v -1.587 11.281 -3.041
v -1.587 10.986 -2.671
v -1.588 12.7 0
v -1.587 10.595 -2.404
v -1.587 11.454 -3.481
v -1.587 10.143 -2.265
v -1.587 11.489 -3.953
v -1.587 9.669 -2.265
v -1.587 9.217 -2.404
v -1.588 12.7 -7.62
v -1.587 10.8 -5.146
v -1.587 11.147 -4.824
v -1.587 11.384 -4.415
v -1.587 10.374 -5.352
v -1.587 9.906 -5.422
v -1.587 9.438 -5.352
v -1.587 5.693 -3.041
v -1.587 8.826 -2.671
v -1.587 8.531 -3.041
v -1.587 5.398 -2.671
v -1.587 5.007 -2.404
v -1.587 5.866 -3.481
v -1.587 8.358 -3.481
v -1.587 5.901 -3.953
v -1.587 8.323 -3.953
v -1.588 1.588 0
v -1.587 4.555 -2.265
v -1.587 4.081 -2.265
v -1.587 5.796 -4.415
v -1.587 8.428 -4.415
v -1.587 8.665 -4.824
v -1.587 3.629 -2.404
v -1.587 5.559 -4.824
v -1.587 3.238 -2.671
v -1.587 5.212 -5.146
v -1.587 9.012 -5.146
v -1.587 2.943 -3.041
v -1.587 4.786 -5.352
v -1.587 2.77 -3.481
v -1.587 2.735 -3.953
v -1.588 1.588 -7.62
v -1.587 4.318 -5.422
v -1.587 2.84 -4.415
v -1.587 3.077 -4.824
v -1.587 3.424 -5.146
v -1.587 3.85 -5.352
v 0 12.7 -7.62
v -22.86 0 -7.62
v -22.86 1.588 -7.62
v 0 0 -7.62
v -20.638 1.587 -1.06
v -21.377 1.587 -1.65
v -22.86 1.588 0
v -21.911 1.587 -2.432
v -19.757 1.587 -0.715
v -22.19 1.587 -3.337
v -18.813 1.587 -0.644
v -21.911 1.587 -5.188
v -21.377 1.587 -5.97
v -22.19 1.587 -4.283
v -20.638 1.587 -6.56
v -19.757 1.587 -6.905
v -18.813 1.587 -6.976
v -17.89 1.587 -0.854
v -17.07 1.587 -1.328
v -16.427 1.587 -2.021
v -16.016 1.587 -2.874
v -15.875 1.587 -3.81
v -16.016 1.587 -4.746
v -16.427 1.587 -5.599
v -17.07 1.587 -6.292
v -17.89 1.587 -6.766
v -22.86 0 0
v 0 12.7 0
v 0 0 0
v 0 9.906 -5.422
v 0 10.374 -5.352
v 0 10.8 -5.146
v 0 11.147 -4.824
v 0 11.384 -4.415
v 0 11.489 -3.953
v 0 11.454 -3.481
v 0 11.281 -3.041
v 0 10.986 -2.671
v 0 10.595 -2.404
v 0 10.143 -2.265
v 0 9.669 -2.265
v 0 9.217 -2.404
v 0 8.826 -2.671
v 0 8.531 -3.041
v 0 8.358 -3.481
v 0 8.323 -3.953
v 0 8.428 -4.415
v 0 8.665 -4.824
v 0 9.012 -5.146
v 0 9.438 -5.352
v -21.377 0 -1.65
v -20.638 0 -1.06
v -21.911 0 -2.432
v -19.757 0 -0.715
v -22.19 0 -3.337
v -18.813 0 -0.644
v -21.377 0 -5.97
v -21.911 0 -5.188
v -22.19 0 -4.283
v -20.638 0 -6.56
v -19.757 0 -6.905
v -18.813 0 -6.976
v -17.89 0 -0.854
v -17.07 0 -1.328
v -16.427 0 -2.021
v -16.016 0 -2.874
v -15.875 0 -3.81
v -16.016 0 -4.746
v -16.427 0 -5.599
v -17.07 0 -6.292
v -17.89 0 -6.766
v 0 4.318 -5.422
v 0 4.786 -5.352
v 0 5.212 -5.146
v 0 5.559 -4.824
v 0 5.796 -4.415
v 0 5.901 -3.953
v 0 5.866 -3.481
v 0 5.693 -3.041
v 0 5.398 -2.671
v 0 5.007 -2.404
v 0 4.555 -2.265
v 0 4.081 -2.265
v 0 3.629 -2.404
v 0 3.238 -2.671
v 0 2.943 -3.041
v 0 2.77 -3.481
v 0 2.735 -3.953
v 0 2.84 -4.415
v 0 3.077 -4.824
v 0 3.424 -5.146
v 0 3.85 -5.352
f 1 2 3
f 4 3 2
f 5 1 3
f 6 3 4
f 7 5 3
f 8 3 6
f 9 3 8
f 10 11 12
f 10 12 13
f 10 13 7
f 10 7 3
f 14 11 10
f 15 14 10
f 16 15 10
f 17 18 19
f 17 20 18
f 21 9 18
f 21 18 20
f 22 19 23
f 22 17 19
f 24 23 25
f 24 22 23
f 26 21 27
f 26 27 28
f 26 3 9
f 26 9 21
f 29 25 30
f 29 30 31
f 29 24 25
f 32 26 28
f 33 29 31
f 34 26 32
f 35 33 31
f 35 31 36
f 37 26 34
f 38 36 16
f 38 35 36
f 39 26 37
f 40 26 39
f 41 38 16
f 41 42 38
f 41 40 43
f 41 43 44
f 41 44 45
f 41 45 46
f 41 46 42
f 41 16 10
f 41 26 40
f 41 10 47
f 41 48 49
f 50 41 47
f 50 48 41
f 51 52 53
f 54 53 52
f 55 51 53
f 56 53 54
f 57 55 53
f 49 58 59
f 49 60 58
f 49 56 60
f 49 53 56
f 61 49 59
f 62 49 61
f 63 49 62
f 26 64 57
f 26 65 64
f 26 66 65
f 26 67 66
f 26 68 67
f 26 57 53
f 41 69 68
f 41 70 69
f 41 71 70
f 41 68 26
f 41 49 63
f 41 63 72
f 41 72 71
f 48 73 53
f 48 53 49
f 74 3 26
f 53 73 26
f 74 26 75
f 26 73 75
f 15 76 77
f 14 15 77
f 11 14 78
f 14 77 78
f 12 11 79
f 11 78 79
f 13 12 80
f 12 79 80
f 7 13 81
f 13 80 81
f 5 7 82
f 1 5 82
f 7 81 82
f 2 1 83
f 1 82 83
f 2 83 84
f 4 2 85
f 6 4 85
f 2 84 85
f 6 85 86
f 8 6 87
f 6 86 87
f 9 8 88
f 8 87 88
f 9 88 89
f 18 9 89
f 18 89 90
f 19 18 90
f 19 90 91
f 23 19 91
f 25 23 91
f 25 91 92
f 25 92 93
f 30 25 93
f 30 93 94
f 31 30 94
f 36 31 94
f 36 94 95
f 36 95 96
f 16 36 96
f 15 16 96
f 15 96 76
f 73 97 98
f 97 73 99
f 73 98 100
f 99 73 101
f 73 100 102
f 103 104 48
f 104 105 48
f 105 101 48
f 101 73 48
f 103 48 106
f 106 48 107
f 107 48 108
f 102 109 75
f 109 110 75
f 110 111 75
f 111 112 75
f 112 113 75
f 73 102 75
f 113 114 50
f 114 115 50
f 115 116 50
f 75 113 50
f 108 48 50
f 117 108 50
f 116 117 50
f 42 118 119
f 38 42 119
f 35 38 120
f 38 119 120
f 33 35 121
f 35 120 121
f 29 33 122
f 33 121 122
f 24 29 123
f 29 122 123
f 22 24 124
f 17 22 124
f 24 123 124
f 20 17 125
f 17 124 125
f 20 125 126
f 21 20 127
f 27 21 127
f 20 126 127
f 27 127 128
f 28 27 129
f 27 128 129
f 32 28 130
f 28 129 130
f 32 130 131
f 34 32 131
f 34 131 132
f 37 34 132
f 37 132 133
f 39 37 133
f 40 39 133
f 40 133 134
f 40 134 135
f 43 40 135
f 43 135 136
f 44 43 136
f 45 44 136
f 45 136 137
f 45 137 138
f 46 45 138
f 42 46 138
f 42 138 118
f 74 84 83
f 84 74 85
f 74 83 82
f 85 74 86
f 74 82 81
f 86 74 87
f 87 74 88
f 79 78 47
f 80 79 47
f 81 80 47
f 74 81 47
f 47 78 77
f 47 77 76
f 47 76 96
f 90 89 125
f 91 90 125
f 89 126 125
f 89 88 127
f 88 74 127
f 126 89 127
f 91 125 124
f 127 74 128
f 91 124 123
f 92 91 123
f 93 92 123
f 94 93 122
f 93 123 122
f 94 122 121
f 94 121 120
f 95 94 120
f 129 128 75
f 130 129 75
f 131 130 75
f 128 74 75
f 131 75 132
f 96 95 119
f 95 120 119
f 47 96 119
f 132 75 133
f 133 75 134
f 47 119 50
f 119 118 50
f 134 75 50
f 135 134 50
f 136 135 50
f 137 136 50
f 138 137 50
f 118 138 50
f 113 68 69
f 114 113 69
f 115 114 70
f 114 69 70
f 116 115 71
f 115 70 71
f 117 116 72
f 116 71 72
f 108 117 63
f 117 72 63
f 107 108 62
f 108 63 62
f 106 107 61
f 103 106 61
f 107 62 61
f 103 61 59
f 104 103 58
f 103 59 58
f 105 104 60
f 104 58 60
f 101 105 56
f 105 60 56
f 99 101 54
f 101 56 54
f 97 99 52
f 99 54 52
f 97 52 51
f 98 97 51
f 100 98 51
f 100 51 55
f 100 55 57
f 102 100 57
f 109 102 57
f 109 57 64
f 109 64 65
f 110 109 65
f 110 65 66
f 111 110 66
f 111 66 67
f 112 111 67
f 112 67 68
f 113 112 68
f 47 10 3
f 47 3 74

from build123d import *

# Parameters (mm, degrees)
SKETCH1_W                    = 23.8125
SKETCH1_H                    = 7.62
BOSS_EXTRUDE1_DEPTH          = 1.5875
SKETCH1_4_W                  = 1.5875
SKETCH1_4_H                  = 7.62
BOSS_EXTRUDE2_DEPTH          = 12.7
F_1_4_0_25_DIAMETER_HOLE1_D  = 6.35
CUT_EXTRUDE2_DEPTH           = 29.752600861
CUT_EXTRUDE2_DEPTH_BACK      = 1.5875
F_1_8_0_125_DIAMETER_HOLE1_D = 3.175


with BuildPart() as part:
    # Sketch1 → Boss-Extrude1 (new body)
    with BuildSketch(Plane(origin=(0, 0, 0), x_dir=(1, 0, 0), z_dir=(0, 1, 0))):
        with Locations((-13.49375, 3.81)):
            Rectangle(SKETCH1_W, SKETCH1_H)
    extrude(amount=BOSS_EXTRUDE1_DEPTH)

    # Sketch1<4> → Boss-Extrude2 (add)
    with BuildSketch(Plane(origin=(0, 0, 0), x_dir=(1, 0, 0), z_dir=(0, 1, 0))):
        with Locations((-0.79375, 3.81)):
            Rectangle(SKETCH1_4_W, SKETCH1_4_H)
    extrude(amount=BOSS_EXTRUDE2_DEPTH)

    # 1/4 (0.25) Diameter Hole1 (through all)
    with Locations(Plane(origin=(0, 0, 0), x_dir=(-1, 0, 0), z_dir=(0, -1, 0))):
        with Locations((19.05, 3.81)):
            Hole(F_1_4_0_25_DIAMETER_HOLE1_D / 2)

    # Sketch7 → Cut-Extrude2 (cut, two sides: drawn at the far end of the back side and taken through both)
    with BuildSketch(Plane(origin=(0, 1.5875, 0), x_dir=(1, 0, 0), z_dir=(0, 1, 0)).offset(-CUT_EXTRUDE2_DEPTH_BACK)):
        Polygon((-22.86, 65.813111541), (-22.86, 7.62), (-22.86, 0), (-22.86, -58.193111541), (-139.246223082, -58.193111541), (-139.246223082, 65.813111541), align=None)
    extrude(amount=CUT_EXTRUDE2_DEPTH + CUT_EXTRUDE2_DEPTH_BACK, mode=Mode.SUBTRACT)

    # 1/8 (0.125) Diameter Hole1 (through all)
    with Locations(Plane.ZY.offset(1.5875)):
        with Locations((-3.834673101, 9.906), (-3.834673101, 4.318)):
            Hole(F_1_8_0_125_DIAMETER_HOLE1_D / 2)


solid = part.part
